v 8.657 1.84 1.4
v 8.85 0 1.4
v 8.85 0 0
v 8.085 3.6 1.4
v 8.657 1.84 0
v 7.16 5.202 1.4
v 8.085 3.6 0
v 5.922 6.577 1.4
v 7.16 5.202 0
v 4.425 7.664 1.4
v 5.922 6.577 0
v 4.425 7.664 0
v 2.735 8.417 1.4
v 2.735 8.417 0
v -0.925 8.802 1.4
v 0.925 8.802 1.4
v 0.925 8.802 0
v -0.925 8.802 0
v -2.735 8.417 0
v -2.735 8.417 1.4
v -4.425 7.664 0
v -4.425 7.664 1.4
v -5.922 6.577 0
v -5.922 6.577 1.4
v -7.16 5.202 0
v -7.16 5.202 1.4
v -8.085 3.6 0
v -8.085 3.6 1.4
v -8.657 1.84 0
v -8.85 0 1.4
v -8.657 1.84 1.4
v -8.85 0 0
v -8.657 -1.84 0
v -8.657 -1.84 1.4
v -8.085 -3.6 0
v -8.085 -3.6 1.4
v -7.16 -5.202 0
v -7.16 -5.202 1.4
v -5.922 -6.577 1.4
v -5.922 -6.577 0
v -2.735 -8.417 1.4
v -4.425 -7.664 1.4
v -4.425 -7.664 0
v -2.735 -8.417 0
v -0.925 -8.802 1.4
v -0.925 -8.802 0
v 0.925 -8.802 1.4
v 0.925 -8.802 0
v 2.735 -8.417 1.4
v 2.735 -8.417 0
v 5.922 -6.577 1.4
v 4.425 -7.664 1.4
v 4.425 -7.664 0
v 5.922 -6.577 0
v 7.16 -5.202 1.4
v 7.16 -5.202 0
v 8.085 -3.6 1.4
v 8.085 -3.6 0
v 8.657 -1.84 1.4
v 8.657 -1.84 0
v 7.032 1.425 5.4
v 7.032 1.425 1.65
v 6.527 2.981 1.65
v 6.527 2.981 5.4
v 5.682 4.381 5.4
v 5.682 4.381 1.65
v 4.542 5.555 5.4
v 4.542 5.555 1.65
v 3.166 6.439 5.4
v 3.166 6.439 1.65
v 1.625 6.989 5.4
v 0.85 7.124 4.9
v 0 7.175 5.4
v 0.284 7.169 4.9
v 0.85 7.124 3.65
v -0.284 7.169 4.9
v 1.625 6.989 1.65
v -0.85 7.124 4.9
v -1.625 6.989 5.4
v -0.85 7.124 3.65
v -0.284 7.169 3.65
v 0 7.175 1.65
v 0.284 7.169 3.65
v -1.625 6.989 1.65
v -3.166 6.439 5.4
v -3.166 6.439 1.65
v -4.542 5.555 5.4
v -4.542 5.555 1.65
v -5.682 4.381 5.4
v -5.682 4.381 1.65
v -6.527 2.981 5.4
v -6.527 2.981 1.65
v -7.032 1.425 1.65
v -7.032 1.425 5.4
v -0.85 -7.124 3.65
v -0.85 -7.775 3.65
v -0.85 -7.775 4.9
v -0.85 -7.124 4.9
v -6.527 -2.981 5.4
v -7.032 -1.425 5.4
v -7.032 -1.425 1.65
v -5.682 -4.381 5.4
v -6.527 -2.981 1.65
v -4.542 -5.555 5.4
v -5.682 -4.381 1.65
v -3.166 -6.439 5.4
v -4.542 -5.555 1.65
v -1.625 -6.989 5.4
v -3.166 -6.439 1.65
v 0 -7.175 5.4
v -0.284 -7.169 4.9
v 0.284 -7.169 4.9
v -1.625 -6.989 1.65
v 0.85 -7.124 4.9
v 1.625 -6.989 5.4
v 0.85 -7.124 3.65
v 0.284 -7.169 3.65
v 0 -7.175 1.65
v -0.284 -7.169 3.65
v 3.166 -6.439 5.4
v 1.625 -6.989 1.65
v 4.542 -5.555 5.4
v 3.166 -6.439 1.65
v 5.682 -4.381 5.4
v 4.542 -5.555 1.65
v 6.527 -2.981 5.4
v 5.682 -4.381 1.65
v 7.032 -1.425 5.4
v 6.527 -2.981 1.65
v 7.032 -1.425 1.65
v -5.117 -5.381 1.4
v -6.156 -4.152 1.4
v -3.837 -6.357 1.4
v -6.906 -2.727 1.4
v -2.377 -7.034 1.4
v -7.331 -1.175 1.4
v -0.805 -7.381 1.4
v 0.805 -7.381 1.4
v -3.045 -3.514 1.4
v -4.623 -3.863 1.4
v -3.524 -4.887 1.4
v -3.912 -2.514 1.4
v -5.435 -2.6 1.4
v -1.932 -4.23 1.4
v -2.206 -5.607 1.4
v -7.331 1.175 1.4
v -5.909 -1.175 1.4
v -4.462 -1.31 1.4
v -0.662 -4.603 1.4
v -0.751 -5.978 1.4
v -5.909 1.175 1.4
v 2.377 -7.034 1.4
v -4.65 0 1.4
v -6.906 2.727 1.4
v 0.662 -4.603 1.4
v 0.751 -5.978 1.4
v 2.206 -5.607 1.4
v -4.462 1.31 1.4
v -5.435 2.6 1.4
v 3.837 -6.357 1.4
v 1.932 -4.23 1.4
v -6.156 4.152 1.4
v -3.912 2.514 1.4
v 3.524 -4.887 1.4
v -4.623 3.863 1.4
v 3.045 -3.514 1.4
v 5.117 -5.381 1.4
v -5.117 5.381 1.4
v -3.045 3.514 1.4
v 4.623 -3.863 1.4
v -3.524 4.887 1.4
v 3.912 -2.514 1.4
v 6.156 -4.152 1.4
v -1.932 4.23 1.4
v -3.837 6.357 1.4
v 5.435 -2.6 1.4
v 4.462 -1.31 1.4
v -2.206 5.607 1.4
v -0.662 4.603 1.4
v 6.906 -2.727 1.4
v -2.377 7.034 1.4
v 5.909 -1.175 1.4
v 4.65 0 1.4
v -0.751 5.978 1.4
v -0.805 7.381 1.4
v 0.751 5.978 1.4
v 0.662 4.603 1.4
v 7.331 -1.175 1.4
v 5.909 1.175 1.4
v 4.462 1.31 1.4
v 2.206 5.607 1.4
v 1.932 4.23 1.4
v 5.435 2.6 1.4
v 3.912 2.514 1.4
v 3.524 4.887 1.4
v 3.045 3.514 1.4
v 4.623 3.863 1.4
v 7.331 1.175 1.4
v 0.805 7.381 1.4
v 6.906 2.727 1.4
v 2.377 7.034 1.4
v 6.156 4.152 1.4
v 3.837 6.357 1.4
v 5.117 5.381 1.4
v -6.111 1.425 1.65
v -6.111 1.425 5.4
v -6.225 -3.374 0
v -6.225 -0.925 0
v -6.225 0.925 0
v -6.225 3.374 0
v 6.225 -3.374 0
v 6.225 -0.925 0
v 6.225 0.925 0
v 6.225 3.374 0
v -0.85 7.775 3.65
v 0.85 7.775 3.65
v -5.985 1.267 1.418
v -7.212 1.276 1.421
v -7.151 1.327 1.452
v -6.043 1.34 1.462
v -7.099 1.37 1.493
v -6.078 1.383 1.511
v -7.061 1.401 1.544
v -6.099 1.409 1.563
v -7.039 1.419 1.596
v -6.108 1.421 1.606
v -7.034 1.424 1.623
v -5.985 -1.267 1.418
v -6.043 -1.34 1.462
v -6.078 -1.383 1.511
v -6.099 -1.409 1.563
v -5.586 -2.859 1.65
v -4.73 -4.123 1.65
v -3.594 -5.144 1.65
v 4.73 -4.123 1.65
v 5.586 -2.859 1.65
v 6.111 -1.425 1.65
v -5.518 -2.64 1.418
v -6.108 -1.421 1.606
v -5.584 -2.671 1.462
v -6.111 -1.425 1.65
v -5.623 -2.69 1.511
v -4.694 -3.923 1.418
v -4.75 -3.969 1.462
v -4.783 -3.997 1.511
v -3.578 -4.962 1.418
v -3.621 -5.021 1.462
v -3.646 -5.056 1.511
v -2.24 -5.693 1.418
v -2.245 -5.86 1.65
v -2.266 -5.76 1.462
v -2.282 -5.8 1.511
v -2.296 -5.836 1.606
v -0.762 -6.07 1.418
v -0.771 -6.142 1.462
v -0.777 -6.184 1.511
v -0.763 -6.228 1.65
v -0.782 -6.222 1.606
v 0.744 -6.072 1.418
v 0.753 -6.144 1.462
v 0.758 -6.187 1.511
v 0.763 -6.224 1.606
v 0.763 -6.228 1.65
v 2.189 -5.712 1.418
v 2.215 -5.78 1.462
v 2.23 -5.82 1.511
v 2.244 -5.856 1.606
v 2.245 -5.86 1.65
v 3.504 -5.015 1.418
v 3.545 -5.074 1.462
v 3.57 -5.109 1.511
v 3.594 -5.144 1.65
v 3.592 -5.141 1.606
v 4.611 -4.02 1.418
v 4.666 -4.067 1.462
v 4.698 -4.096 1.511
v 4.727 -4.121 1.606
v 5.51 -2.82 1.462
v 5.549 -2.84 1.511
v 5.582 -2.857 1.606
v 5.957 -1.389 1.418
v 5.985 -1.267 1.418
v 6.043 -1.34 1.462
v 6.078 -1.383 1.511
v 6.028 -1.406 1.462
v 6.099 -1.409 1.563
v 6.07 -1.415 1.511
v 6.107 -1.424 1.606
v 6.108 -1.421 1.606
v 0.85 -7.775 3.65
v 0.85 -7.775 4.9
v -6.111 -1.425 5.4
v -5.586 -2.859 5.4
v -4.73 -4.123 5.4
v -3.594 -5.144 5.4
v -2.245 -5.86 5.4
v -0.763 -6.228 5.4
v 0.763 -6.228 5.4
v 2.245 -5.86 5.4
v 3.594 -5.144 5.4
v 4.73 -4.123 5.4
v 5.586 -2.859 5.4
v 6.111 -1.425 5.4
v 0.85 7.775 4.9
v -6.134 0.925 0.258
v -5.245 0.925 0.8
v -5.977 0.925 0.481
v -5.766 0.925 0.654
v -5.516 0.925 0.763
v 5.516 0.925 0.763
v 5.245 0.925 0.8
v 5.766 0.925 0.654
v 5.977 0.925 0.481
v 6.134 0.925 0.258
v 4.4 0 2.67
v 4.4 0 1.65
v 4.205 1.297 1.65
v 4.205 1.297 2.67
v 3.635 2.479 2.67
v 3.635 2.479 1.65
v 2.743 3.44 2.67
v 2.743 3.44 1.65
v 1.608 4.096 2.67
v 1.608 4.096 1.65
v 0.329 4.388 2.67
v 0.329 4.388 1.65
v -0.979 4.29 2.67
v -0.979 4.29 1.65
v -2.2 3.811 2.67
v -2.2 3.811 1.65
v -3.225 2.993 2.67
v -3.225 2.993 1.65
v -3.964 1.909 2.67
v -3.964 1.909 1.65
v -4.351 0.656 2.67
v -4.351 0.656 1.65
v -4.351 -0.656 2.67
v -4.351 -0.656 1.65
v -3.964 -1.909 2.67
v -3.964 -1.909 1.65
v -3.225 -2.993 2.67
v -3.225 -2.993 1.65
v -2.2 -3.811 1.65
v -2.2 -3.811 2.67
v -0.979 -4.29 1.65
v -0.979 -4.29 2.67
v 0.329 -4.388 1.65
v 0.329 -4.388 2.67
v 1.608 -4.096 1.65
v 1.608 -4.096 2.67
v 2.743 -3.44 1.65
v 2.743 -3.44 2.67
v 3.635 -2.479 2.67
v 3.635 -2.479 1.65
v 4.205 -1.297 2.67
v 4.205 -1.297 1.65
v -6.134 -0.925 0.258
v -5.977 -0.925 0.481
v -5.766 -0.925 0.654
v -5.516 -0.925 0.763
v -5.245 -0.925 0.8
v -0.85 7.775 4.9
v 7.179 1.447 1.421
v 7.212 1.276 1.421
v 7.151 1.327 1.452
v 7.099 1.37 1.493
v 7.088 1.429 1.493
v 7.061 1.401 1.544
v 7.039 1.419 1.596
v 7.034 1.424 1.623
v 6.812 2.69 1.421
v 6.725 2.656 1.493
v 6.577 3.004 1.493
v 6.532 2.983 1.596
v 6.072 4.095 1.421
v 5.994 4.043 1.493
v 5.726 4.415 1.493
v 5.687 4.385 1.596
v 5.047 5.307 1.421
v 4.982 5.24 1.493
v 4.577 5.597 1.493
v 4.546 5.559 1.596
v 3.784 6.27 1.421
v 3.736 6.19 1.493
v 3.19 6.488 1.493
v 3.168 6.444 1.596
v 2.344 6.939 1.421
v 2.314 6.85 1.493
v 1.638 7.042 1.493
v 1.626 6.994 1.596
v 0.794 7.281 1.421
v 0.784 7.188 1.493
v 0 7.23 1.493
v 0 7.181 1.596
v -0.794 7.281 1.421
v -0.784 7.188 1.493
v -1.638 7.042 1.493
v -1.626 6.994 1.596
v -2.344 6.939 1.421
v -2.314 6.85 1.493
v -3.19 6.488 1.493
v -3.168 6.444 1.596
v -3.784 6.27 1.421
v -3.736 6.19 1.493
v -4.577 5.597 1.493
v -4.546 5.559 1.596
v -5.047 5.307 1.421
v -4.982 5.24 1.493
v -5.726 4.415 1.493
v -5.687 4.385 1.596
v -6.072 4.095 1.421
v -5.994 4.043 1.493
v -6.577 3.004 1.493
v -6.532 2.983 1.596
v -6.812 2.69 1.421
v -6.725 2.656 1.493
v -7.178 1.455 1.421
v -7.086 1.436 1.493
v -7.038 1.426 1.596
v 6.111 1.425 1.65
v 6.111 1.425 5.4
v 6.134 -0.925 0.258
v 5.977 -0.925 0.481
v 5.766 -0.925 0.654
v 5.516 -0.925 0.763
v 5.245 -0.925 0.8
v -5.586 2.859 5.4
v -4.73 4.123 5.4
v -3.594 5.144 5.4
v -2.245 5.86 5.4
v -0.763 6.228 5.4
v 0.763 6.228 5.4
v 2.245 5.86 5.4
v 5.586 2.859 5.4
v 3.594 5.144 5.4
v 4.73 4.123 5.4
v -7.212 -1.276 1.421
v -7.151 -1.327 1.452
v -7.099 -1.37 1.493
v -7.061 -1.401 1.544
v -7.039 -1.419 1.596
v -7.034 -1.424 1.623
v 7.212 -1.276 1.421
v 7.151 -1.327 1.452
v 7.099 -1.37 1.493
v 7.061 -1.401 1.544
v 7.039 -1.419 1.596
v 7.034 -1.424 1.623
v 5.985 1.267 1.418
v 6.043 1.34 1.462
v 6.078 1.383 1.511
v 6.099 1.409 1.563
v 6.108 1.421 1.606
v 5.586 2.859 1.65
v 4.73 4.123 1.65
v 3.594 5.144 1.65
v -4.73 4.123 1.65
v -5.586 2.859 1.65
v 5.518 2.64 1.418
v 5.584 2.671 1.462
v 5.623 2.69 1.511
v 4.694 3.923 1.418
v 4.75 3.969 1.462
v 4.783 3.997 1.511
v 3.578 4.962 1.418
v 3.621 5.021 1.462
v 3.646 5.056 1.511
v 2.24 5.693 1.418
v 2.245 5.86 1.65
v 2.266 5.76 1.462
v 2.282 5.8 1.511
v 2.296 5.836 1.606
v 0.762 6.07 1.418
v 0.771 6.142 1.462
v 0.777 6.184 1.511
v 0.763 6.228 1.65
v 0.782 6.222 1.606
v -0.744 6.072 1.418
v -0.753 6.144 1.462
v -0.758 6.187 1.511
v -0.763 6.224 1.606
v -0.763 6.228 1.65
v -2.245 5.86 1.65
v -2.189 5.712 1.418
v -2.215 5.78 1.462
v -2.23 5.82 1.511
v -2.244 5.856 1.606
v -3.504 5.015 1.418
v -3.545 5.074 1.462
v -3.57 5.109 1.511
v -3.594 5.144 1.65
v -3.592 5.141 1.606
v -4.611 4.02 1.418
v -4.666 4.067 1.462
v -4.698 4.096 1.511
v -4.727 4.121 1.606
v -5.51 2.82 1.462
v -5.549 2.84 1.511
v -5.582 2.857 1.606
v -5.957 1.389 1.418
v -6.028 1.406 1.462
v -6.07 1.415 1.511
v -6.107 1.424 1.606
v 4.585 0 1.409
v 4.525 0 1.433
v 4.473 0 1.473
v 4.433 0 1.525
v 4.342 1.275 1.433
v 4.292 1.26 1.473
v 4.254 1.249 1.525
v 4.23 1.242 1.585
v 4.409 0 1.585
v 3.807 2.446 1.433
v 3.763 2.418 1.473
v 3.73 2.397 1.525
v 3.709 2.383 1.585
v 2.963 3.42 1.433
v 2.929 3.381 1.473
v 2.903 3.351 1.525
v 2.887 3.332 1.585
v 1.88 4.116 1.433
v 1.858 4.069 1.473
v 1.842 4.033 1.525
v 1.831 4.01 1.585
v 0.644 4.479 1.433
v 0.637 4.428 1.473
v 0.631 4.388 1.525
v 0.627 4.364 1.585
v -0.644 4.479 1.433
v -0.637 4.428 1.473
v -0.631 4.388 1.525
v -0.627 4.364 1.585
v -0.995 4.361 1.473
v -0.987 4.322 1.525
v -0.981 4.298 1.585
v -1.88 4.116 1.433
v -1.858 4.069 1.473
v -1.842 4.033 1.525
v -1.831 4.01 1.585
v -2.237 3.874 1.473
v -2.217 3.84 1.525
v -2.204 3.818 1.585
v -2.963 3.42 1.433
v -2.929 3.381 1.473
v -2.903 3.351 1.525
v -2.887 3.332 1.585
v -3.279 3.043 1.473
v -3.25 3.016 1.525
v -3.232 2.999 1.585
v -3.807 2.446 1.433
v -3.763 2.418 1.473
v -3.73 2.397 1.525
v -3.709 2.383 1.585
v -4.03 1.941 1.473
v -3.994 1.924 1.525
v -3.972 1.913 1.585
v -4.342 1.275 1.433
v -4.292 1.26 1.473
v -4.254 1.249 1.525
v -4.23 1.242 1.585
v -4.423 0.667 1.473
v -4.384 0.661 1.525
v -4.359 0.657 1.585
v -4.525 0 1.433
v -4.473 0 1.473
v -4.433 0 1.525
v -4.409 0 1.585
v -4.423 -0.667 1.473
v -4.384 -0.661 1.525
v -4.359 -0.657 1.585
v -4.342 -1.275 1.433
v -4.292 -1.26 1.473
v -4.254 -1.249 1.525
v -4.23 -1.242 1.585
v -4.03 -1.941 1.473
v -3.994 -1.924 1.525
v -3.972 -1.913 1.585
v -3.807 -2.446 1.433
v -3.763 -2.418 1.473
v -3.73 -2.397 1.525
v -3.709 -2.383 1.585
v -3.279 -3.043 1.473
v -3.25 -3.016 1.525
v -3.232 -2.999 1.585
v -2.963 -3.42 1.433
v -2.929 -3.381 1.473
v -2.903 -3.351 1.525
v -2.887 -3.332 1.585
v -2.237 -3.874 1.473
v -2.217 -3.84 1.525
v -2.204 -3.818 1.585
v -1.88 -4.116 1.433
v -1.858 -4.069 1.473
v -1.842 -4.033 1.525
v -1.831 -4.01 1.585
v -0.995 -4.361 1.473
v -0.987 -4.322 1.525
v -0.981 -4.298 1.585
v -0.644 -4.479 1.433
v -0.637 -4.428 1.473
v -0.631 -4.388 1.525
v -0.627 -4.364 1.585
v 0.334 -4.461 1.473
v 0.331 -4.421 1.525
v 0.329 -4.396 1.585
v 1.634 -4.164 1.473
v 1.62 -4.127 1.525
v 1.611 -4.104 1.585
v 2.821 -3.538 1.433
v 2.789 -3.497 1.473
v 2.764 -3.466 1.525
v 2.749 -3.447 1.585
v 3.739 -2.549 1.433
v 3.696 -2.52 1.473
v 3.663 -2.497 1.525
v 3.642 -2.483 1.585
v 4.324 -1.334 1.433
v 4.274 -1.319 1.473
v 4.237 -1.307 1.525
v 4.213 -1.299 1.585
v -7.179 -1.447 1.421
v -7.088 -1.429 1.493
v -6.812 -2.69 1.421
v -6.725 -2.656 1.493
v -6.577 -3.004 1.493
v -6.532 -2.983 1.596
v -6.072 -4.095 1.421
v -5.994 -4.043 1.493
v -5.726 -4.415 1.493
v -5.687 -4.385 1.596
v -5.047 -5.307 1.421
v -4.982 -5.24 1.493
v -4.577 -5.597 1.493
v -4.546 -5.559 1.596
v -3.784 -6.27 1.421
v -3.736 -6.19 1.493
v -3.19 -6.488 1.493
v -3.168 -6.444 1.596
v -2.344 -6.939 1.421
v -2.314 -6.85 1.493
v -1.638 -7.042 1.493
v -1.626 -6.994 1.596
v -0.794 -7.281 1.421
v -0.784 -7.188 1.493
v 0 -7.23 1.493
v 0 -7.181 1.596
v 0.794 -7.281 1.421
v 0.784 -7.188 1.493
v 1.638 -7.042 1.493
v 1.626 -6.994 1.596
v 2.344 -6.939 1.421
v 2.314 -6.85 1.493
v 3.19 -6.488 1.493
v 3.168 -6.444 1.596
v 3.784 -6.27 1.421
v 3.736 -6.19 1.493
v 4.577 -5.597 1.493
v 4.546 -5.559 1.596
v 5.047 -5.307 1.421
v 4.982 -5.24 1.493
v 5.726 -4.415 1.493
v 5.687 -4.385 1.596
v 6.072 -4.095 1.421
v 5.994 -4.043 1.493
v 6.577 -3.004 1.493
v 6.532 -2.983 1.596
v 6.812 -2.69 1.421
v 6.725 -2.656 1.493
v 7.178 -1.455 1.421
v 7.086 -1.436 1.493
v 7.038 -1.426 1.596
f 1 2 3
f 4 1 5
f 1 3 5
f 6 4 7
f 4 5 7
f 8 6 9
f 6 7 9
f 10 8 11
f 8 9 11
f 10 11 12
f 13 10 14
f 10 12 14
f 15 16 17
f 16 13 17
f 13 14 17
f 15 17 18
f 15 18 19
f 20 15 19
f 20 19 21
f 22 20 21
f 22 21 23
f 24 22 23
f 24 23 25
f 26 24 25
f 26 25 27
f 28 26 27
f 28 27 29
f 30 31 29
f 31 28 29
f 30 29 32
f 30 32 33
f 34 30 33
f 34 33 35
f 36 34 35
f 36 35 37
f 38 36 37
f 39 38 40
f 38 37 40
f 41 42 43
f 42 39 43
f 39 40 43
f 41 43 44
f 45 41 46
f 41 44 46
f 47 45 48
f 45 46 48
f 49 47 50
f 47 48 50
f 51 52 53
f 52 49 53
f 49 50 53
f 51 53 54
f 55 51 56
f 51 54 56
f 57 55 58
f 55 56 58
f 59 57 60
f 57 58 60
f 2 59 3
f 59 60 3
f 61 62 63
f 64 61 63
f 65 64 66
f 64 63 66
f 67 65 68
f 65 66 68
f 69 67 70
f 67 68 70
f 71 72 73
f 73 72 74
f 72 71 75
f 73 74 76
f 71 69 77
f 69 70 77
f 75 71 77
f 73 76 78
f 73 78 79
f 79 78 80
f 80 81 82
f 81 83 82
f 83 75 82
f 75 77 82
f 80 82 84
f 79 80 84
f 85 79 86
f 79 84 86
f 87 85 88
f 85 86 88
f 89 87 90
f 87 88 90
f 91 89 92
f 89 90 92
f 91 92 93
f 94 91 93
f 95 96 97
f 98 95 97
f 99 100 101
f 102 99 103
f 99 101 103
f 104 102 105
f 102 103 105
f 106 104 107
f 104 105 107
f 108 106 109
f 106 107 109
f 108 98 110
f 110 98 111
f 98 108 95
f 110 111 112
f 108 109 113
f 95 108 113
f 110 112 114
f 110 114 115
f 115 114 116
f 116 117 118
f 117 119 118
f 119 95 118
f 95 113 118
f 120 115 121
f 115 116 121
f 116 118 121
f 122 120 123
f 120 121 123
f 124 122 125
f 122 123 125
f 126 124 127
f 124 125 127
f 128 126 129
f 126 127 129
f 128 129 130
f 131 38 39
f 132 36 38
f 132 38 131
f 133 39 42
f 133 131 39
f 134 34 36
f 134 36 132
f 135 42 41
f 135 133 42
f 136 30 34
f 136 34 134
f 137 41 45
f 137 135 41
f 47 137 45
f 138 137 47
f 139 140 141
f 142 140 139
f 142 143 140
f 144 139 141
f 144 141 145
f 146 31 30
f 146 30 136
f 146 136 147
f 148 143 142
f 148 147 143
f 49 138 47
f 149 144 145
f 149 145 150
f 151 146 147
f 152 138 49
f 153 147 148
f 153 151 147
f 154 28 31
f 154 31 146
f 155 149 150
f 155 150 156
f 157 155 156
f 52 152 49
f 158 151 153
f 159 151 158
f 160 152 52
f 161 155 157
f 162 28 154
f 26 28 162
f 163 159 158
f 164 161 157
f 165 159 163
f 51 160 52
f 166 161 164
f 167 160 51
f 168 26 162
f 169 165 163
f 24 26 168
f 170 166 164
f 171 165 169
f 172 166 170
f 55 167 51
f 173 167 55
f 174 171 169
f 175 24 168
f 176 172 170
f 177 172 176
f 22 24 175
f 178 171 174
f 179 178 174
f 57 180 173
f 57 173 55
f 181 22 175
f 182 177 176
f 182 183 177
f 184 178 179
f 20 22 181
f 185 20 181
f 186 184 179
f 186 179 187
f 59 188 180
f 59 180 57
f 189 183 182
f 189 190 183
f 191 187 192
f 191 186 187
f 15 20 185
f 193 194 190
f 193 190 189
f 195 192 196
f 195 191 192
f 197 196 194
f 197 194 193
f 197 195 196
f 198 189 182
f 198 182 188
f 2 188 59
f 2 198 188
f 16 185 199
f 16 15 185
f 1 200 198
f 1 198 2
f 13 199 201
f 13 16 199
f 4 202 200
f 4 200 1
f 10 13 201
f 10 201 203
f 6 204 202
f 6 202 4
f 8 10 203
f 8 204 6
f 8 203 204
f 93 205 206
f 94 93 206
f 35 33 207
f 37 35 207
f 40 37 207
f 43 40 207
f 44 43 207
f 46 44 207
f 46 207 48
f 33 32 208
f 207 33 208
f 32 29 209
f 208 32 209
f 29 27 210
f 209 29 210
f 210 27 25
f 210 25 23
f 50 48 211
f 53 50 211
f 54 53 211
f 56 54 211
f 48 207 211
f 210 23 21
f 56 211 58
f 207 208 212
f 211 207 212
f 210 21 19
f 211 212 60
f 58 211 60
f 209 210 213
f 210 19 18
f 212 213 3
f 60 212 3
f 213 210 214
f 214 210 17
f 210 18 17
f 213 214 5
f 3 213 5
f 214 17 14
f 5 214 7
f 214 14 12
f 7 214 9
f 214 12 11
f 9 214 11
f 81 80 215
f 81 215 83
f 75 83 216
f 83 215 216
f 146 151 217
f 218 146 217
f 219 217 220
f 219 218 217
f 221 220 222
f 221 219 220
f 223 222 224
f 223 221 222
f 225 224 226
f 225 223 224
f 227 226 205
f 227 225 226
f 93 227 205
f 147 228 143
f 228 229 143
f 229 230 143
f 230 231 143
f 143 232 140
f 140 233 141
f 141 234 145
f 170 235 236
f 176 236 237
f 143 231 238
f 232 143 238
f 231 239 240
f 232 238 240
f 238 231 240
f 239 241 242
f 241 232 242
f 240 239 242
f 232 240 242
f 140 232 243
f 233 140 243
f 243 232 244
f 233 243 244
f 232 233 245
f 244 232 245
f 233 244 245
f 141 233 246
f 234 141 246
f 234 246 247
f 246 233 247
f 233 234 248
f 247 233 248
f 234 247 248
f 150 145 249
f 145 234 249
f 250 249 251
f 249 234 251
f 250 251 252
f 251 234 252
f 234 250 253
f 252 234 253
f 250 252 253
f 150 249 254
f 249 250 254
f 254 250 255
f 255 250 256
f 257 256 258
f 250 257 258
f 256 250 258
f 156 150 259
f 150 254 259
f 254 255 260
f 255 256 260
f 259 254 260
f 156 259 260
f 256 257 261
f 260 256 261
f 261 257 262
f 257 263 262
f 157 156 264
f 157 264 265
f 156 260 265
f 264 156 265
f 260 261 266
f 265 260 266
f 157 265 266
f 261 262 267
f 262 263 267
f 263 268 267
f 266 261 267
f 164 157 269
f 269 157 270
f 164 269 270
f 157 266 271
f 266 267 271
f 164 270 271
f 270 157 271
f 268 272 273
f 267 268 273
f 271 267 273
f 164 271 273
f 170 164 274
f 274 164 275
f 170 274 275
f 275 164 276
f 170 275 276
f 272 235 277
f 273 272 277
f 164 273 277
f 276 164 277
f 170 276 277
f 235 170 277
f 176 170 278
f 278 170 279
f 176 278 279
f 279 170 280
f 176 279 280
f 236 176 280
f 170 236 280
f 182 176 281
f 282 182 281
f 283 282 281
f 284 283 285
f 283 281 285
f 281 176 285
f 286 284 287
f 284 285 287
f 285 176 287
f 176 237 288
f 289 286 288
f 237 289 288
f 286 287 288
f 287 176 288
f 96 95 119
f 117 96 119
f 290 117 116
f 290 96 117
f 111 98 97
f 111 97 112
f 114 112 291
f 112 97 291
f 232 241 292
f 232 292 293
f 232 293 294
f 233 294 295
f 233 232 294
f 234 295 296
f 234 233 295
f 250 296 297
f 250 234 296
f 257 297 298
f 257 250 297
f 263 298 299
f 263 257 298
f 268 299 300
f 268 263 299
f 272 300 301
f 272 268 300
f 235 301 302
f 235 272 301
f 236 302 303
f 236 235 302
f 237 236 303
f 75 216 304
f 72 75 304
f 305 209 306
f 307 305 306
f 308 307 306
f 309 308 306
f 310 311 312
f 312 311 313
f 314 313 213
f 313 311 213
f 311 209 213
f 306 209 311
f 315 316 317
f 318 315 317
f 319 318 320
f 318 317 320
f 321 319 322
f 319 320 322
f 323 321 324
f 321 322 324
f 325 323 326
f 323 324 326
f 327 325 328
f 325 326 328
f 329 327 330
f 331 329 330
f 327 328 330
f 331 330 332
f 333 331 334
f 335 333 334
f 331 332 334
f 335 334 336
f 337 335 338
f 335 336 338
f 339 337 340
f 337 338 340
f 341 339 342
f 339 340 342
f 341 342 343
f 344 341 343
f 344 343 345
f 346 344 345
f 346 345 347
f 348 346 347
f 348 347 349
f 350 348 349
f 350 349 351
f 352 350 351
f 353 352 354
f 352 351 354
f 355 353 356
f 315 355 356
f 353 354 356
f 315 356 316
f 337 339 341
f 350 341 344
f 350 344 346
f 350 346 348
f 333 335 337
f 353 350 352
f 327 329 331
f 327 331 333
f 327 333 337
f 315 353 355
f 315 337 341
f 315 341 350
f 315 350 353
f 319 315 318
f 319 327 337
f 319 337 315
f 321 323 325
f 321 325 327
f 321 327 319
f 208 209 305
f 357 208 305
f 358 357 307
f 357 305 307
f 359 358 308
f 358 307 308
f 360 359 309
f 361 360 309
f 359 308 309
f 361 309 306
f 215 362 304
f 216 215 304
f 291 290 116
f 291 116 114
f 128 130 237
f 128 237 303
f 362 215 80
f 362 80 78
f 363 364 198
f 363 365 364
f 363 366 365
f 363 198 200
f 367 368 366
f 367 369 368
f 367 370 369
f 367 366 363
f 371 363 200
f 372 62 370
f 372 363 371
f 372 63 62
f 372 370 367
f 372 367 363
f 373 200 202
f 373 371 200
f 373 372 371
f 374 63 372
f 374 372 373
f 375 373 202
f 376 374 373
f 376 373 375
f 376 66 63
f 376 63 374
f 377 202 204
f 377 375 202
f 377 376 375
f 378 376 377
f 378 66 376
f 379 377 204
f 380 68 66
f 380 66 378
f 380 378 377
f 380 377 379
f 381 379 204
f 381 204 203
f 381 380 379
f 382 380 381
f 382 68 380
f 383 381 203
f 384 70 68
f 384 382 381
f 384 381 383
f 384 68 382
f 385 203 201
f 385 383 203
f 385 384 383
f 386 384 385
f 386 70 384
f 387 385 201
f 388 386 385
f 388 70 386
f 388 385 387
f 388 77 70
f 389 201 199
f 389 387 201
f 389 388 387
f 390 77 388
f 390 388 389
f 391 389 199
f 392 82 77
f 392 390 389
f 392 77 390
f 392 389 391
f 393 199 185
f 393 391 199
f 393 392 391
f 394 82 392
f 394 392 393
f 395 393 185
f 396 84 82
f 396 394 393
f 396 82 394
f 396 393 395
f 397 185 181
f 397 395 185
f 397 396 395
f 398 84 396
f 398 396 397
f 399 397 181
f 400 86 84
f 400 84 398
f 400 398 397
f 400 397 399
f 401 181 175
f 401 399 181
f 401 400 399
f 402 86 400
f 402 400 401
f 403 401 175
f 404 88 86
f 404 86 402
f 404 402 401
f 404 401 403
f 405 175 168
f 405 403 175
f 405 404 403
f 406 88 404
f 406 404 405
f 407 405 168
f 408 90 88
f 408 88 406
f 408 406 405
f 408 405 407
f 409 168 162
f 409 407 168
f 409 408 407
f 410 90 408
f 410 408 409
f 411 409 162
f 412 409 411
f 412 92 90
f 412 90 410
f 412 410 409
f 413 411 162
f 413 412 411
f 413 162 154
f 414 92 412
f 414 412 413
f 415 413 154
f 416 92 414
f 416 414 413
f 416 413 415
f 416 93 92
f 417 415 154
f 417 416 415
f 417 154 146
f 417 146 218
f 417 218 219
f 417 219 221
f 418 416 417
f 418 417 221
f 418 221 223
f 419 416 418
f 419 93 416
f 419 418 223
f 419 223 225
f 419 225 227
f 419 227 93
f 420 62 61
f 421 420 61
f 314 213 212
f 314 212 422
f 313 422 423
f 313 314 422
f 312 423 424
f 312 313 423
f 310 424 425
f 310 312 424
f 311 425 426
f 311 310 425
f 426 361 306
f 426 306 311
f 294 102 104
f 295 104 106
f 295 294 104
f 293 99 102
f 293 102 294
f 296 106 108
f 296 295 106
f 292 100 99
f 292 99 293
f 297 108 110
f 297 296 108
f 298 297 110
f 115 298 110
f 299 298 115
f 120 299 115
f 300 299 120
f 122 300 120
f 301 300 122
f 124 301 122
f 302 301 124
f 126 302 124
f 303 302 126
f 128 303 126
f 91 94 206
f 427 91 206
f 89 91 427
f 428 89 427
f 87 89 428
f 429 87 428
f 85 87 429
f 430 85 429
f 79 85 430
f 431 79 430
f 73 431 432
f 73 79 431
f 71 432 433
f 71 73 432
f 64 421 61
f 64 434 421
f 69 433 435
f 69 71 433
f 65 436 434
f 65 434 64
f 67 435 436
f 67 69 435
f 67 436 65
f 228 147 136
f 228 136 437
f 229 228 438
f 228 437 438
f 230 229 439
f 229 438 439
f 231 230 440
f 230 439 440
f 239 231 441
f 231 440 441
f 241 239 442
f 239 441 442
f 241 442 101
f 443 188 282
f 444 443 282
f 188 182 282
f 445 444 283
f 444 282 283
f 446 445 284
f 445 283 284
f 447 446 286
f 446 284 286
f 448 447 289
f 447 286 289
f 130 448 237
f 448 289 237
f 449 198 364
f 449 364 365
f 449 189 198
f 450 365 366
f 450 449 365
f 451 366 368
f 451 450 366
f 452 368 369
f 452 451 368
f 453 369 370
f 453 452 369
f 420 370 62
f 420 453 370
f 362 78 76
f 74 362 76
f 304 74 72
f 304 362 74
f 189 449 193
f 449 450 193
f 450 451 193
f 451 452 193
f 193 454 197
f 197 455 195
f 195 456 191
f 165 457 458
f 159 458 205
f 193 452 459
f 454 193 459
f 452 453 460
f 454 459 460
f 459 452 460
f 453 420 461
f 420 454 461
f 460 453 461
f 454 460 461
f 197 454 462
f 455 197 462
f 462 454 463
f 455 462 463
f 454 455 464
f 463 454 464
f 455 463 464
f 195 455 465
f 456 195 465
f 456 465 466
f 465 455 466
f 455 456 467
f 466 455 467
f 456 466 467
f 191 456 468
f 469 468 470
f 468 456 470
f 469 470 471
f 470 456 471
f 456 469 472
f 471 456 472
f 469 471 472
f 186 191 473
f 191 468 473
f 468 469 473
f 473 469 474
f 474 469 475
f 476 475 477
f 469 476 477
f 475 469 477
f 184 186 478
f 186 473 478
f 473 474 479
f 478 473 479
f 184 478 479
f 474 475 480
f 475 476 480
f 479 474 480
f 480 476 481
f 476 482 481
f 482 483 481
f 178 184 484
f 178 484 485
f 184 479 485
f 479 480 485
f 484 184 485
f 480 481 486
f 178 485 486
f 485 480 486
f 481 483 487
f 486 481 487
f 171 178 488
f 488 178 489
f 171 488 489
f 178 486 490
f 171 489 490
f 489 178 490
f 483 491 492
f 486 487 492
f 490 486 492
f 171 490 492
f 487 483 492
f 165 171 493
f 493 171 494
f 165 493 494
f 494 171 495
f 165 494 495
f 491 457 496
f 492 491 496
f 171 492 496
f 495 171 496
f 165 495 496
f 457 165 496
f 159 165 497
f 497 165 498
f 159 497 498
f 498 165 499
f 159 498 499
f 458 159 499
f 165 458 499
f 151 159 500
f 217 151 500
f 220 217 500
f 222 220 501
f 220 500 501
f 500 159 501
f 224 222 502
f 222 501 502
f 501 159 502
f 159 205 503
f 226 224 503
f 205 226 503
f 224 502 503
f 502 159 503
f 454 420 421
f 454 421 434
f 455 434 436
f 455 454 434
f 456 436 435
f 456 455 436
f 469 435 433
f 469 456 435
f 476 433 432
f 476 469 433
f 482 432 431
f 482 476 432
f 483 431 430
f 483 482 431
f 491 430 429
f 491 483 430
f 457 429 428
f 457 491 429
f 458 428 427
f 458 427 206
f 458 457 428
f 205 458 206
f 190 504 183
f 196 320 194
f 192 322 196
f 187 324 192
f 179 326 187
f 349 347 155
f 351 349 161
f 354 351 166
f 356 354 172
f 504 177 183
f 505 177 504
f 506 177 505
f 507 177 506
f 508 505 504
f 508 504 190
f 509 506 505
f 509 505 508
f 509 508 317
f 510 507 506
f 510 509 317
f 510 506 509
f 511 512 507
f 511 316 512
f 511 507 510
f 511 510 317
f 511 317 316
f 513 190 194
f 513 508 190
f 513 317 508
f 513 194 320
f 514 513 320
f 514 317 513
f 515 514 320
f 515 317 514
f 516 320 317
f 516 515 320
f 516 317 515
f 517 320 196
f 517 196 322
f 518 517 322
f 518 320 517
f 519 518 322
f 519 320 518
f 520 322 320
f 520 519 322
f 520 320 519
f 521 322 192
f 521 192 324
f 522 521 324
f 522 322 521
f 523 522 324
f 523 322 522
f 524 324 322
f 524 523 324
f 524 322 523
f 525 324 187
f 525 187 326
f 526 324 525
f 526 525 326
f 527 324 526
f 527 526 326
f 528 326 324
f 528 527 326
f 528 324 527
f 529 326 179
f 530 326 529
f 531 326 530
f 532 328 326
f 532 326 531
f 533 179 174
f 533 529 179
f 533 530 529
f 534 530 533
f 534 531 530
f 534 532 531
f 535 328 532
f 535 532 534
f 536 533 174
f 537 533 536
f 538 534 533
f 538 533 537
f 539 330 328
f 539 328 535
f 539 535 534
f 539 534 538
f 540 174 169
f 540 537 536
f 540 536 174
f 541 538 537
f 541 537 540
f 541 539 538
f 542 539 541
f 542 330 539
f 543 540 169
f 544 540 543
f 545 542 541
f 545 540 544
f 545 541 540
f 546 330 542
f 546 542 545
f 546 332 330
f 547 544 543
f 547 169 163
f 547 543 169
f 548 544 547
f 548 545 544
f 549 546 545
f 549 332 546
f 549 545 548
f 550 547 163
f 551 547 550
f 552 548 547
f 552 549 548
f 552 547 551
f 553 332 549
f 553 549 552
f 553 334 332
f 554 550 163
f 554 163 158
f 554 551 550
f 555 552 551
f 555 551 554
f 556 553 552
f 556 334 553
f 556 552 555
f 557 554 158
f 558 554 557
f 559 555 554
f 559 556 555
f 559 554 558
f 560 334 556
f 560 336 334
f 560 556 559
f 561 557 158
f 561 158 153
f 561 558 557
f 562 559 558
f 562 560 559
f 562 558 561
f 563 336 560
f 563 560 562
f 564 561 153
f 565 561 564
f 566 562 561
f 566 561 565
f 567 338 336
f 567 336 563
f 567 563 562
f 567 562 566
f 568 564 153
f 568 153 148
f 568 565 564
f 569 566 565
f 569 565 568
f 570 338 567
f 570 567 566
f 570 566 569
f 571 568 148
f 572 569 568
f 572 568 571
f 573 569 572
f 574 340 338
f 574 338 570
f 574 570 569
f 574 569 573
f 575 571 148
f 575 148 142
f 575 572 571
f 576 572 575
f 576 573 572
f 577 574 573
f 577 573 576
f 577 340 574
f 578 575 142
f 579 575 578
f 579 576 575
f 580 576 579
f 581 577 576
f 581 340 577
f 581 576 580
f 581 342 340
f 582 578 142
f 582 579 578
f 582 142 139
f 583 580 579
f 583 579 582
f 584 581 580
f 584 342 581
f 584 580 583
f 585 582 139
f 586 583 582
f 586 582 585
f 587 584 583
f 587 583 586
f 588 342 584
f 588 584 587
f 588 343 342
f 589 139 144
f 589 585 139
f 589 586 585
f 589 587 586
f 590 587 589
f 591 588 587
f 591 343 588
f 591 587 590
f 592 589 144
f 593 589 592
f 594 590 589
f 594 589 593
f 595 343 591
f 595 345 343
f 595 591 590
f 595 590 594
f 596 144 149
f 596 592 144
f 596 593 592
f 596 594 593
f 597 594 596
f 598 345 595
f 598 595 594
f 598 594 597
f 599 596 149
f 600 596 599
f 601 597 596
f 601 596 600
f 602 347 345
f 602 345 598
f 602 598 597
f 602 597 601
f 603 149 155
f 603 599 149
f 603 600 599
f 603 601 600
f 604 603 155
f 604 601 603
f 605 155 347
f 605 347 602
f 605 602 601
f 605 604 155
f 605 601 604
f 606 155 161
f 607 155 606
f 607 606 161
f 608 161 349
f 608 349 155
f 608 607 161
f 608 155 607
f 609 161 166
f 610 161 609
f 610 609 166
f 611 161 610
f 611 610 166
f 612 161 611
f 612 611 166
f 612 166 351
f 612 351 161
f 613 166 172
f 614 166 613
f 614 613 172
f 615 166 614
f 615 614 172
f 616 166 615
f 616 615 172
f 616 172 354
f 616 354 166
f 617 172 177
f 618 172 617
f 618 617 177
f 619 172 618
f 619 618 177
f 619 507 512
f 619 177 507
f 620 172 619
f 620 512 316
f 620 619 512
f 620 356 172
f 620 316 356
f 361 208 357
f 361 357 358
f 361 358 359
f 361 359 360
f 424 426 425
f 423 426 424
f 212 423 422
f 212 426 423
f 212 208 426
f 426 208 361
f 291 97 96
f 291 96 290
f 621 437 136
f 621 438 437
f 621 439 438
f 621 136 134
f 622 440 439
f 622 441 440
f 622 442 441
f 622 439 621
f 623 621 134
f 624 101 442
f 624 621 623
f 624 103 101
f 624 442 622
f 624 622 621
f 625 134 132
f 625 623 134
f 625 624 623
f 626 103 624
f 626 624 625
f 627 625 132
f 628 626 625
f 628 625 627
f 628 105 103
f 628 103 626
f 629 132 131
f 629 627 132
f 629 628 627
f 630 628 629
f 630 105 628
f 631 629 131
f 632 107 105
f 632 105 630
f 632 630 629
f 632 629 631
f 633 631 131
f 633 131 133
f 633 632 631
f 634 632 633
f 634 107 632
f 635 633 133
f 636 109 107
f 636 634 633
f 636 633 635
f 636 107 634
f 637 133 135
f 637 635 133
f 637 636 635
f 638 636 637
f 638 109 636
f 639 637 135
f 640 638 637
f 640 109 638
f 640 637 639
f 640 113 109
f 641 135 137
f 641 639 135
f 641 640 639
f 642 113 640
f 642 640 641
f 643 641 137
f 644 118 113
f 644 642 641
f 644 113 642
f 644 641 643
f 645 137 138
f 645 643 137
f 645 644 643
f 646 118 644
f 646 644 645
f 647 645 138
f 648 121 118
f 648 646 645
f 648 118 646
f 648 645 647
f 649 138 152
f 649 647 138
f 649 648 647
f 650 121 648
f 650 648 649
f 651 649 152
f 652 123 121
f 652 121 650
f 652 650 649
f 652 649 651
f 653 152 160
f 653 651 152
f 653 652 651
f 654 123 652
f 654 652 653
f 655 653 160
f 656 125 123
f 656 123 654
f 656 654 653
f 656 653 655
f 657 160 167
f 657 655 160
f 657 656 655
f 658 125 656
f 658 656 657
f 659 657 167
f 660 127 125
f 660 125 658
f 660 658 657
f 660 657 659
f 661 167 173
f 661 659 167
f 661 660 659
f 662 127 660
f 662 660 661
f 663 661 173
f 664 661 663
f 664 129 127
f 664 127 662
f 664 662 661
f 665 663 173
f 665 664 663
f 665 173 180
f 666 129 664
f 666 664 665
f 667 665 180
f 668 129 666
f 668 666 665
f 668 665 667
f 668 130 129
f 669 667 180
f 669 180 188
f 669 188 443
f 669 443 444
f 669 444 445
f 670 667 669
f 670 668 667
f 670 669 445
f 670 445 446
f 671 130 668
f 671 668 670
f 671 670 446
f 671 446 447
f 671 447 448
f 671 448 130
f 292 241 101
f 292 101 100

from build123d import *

# Parameters (mm, degrees)
F0_R         = 8.85
F1_DEPTH     = 1.4
F2_R         = 7.175
F2_R_2       = 6.275
F3_DEPTH     = 4
F5_W         = 2.85
F5_H         = 4
F6_DEPTH     = 25
F7_R         = 4.4
F8_DEPTH     = 1.27
F10_W        = 1.7
F10_H        = 1.25
F11_DEPTH    = 0.6
F12_W        = 12.45
F12_H        = 1.85
F13_DEPTH    = 0.8
F14_T1_DEPTH = 6.7489794856
F15_R        = 0.25


# Not quite as in the source:
# - a fillet or chamfer that OpenCascade refuses, or shapes differently, is made with other operations: its cross-section is extruded or revolved along the edge and cut away or added
# - a pattern or mirror of a feature is missing from the dataset's text; its kind, count and spacing are read off the source's solid


with BuildPart() as f1:
    # F0 (on Top) → F1 (new body)
    with BuildSketch(Plane.XY):
        Circle(F0_R)
    extrude(amount=F1_DEPTH)

    # F2 (on face) → F3 (join)
    with BuildSketch(Plane.XY.offset(1.4)):
        Circle(F2_R)
        Circle(F2_R_2, mode=Mode.SUBTRACT)
    extrude(amount=F3_DEPTH)

    # F5 (on offset) → F6 (cut)
    with BuildSketch(Plane.YZ.offset(7.175)):
        with Locations((0, 3.4)):
            Rectangle(F5_W, F5_H)
    extrude(amount=-F6_DEPTH, mode=Mode.SUBTRACT)

    # F7 (on face) → F8 (join)
    with BuildSketch(Plane.XY.offset(1.4)):
        Circle(F7_R)
    extrude(amount=F8_DEPTH)

    # F10 (on offset) → F11 (join, symmetric)
    with BuildSketch(Plane.XZ.offset(7.175)):
        with Locations((0, 4.275)):
            Rectangle(F10_W, F10_H)
    f11 = extrude(amount=F11_DEPTH, both=True)

    # F11_copies: F11 across plane
    add(f11.mirror(Plane.ZX))

    # F12 (on face) → F13 (cut)
    with BuildSketch(Plane(origin=(0, 0, 0), x_dir=(1, 0, 0), z_dir=(0, 0, -1))):
        Rectangle(F12_W, F12_H)
    extrude(amount=-F13_DEPTH, mode=Mode.SUBTRACT)

    # F14: fillet of radius 1 on 2 edges, made by hand

    # F14_s2 → F14_t1 (join)
    with BuildSketch(Plane.XZ.offset(-3.3744897428)):
        with BuildLine():
            ThreePointArc((-6.225, 0), (-5.8776596349, 0.5745966692), (-5.2452041029, 0.8))
            Line((-5.2452041029, 0.8), (-6.225, 0.8))
            Line((-6.225, 0.8), (-6.225, 0))
        make_face()
        with BuildLine():
            ThreePointArc((6.225, 0), (5.8776596349, 0.5745966692), (5.2452041029, 0.8))
            Line((5.2452041029, 0.8), (6.225, 0.8))
            Line((6.225, 0.8), (6.225, 0))
        make_face()
    extrude(amount=F14_T1_DEPTH)

    # F15
    f15_edges = [f1.edges().sort_by_distance(p)[0] for p in [
        (0, 6.275, 1.4),
        (6.571562, 1.425, 1.4),
        (-6.571562, 1.425, 1.4),
        (0, 7.175, 1.4),
        (-4.4, 0, 1.4),
        (-6.571562, -1.425, 1.4),
        (6.571562, -1.425, 1.4),
        (0, -7.175, 1.4),
        (0, -6.275, 1.4),
    ]]
    fillet(f15_edges, radius=F15_R)


solid = f1.part
